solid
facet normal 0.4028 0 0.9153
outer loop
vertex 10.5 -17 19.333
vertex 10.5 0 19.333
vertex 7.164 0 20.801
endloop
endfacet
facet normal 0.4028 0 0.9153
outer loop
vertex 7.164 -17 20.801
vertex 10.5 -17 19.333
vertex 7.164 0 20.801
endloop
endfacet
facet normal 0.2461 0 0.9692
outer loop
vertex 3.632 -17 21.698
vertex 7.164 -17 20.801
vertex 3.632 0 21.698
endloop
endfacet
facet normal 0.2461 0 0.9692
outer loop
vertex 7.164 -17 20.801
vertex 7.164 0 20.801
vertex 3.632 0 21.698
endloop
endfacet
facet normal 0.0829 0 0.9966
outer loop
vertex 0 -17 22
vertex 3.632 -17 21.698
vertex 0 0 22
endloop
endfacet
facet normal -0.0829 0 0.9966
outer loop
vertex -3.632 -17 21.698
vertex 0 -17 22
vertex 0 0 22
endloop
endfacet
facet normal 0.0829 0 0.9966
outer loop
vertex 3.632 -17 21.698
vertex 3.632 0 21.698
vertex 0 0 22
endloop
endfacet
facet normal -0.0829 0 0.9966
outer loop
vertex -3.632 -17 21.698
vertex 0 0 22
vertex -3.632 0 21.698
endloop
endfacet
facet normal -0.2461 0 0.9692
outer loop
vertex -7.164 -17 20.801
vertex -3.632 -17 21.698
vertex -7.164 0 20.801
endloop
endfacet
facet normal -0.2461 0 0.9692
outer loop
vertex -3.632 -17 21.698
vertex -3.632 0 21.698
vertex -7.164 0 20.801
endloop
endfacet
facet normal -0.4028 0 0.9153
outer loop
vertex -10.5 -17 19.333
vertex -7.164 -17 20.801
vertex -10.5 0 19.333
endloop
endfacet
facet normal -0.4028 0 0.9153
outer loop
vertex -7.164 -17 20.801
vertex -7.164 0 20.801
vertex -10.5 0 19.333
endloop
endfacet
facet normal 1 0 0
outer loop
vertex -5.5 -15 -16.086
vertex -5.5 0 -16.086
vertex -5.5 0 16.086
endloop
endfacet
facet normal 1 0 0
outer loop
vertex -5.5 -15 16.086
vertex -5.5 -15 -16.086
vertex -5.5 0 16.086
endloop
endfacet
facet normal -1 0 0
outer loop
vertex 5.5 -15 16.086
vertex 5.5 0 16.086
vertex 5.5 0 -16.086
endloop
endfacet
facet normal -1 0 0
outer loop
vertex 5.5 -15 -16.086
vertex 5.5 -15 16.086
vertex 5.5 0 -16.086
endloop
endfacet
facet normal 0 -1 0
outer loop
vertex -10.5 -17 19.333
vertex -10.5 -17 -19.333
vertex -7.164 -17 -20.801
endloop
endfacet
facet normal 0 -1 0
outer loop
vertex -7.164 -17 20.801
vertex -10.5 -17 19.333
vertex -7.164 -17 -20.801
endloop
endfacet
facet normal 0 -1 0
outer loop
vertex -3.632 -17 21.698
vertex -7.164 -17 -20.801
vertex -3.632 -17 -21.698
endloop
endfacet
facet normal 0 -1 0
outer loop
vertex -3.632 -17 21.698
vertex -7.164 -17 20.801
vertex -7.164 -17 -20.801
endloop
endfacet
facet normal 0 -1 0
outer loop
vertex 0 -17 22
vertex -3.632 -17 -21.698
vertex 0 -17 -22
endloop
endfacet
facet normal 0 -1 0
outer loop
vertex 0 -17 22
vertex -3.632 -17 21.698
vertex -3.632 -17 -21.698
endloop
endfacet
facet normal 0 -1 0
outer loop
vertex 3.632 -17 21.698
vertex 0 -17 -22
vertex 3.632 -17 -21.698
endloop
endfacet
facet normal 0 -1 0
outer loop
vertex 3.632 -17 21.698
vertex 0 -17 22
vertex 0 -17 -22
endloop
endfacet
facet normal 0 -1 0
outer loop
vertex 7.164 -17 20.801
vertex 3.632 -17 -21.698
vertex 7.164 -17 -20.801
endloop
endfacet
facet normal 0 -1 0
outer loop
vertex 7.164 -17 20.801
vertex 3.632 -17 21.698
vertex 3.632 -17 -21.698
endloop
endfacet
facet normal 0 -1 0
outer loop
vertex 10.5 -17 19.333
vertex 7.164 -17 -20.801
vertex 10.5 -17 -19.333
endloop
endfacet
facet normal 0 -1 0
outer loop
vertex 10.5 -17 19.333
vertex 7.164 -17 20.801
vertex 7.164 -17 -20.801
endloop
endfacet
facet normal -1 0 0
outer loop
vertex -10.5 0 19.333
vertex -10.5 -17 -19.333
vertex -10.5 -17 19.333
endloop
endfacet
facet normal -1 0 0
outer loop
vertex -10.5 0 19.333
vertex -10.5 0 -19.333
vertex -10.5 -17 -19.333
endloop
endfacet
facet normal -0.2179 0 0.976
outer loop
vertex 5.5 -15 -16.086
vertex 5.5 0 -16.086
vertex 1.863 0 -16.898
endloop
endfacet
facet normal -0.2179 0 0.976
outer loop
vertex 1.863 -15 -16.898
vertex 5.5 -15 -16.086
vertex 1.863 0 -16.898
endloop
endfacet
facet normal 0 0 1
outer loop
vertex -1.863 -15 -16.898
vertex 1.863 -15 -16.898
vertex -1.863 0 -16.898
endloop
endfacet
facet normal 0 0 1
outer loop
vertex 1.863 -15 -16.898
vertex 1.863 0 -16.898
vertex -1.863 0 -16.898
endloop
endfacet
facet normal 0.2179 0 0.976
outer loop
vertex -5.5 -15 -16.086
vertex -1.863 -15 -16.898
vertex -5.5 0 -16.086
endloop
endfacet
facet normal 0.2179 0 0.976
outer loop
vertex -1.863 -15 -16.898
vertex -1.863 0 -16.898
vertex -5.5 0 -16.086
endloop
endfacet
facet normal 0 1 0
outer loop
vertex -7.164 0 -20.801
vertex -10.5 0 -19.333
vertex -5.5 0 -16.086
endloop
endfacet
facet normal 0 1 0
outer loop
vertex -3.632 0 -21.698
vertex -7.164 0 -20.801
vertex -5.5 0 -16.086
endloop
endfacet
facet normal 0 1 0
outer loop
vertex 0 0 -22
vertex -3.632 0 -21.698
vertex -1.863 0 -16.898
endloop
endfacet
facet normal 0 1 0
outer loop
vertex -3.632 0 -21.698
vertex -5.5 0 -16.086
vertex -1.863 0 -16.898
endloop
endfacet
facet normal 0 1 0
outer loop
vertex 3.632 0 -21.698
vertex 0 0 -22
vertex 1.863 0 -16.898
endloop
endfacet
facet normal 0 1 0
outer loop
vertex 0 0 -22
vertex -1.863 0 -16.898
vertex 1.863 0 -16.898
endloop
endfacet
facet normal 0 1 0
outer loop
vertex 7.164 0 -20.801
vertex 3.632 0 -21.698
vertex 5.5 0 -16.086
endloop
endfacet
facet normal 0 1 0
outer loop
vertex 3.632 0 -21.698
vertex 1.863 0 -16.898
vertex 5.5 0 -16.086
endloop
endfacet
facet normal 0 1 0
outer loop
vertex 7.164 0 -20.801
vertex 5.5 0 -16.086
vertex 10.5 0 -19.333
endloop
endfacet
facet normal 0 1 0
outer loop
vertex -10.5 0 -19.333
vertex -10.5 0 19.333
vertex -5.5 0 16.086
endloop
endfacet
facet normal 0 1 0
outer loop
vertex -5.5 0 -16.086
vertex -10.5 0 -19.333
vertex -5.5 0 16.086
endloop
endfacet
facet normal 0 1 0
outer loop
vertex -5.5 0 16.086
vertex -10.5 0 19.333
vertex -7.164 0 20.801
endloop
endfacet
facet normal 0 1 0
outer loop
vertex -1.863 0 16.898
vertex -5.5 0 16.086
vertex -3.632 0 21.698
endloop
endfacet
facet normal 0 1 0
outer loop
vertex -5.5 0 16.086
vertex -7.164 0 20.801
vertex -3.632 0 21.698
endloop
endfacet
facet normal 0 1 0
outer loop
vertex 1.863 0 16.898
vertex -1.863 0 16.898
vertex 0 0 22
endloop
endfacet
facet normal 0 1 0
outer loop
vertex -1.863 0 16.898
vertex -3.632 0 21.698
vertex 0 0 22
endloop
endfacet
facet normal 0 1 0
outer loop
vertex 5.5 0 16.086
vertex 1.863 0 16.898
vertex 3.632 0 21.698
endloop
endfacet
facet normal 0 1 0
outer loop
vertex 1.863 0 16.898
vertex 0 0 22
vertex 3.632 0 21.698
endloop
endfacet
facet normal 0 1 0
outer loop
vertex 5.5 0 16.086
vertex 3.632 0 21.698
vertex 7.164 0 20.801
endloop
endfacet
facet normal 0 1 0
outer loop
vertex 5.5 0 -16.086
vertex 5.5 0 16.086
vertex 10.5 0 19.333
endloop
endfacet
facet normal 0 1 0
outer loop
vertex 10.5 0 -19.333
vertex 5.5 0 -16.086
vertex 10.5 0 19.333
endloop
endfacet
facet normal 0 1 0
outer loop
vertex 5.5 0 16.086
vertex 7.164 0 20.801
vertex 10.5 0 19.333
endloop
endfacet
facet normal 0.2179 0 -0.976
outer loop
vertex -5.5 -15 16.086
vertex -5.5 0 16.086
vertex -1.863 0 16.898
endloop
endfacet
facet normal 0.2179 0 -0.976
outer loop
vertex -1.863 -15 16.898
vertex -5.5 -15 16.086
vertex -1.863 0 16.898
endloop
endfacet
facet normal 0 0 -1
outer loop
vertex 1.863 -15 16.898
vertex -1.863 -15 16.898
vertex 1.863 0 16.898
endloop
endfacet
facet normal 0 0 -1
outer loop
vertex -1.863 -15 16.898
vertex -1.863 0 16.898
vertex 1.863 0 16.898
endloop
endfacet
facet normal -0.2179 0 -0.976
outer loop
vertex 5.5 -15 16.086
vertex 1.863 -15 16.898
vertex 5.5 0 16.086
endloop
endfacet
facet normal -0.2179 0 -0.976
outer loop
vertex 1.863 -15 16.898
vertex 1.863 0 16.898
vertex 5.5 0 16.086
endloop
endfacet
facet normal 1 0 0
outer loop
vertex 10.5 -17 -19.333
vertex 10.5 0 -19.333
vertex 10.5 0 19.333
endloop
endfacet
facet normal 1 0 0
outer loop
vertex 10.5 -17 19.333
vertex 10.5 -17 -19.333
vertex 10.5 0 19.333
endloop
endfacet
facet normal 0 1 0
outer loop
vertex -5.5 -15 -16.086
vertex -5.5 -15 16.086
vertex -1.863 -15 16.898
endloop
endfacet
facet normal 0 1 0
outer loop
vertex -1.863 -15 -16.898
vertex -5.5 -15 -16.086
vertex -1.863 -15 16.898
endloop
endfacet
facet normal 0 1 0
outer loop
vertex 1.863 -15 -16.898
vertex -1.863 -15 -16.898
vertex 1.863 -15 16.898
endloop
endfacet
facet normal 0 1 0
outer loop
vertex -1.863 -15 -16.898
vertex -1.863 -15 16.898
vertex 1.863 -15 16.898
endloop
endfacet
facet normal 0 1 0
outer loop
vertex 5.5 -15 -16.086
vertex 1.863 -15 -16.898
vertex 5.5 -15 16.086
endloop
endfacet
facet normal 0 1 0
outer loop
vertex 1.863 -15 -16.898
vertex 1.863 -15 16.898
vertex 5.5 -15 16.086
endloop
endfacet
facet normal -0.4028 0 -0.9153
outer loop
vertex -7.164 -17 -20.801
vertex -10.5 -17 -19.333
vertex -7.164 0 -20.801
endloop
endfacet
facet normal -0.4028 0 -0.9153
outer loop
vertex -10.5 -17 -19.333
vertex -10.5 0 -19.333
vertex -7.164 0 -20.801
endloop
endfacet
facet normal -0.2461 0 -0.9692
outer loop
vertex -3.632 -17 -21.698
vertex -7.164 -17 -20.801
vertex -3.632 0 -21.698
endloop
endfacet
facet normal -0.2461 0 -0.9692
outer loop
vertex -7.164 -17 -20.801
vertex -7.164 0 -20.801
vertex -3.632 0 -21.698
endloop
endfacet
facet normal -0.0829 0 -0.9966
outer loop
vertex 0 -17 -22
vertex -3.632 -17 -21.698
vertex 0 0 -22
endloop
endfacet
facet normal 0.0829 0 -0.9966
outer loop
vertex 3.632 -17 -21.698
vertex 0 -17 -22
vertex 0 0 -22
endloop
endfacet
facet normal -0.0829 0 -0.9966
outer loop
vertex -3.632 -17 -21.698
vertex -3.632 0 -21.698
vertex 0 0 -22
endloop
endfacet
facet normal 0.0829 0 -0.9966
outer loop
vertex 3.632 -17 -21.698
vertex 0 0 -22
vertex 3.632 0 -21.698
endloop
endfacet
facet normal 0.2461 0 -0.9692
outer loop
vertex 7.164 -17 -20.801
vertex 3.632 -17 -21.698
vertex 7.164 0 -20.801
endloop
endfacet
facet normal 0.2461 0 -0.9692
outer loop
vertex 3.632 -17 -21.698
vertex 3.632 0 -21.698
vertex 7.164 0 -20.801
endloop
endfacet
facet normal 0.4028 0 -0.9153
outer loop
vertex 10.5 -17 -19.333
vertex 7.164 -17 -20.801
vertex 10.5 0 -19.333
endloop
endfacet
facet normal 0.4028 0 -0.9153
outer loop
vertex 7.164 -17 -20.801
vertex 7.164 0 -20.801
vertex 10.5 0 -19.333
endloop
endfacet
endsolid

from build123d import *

# Parameters (mm, degrees)
F1_DEPTH = 15
F2_W     = 21
F2_H     = 38.66523
F3_DEPTH = 2


with BuildPart() as f1:
    # F0 (on Front) → F1 (new body)
    with BuildSketch(Plane.XZ):
        with BuildLine():
            Line((-10.5, 19.332615), (-10.5, -19.332615))
            ThreePointArc((-10.5, -19.332615), (0, -22), (10.5, -19.332615))
            Line((10.5, -19.332615), (10.5, 19.332615))
            ThreePointArc((10.5, 19.332615), (0, 22), (-10.5, 19.332615))
        make_face()
        with BuildLine():
            ThreePointArc((-5.500001, 16.085709), (0, 17.000001), (5.500001, 16.085709))
            Line((5.500001, 16.085709), (5.500001, -16.085709))
            ThreePointArc((5.500001, -16.085709), (0, -17.000001), (-5.500001, -16.085709))
            Line((-5.500001, -16.085709), (-5.500001, 16.085709))
        make_face(mode=Mode.SUBTRACT)
    extrude(amount=F1_DEPTH)

    # F2 (on face) → F3 (join)
    with BuildSketch(Plane.XZ.offset(15)):
        with BuildLine():
            ThreePointArc((10.5, 19.332615), (0, 22), (-10.5, 19.332615))
            Line((-10.5, 19.332615), (10.5, 19.332615))
        make_face()
        Rectangle(F2_W, F2_H)
        with BuildLine():
            Line((10.5, -19.332615), (-10.5, -19.332615))
            ThreePointArc((-10.5, -19.332615), (0, -22), (10.5, -19.332615))
        make_face()
    extrude(amount=F3_DEPTH)


solid = f1.part
